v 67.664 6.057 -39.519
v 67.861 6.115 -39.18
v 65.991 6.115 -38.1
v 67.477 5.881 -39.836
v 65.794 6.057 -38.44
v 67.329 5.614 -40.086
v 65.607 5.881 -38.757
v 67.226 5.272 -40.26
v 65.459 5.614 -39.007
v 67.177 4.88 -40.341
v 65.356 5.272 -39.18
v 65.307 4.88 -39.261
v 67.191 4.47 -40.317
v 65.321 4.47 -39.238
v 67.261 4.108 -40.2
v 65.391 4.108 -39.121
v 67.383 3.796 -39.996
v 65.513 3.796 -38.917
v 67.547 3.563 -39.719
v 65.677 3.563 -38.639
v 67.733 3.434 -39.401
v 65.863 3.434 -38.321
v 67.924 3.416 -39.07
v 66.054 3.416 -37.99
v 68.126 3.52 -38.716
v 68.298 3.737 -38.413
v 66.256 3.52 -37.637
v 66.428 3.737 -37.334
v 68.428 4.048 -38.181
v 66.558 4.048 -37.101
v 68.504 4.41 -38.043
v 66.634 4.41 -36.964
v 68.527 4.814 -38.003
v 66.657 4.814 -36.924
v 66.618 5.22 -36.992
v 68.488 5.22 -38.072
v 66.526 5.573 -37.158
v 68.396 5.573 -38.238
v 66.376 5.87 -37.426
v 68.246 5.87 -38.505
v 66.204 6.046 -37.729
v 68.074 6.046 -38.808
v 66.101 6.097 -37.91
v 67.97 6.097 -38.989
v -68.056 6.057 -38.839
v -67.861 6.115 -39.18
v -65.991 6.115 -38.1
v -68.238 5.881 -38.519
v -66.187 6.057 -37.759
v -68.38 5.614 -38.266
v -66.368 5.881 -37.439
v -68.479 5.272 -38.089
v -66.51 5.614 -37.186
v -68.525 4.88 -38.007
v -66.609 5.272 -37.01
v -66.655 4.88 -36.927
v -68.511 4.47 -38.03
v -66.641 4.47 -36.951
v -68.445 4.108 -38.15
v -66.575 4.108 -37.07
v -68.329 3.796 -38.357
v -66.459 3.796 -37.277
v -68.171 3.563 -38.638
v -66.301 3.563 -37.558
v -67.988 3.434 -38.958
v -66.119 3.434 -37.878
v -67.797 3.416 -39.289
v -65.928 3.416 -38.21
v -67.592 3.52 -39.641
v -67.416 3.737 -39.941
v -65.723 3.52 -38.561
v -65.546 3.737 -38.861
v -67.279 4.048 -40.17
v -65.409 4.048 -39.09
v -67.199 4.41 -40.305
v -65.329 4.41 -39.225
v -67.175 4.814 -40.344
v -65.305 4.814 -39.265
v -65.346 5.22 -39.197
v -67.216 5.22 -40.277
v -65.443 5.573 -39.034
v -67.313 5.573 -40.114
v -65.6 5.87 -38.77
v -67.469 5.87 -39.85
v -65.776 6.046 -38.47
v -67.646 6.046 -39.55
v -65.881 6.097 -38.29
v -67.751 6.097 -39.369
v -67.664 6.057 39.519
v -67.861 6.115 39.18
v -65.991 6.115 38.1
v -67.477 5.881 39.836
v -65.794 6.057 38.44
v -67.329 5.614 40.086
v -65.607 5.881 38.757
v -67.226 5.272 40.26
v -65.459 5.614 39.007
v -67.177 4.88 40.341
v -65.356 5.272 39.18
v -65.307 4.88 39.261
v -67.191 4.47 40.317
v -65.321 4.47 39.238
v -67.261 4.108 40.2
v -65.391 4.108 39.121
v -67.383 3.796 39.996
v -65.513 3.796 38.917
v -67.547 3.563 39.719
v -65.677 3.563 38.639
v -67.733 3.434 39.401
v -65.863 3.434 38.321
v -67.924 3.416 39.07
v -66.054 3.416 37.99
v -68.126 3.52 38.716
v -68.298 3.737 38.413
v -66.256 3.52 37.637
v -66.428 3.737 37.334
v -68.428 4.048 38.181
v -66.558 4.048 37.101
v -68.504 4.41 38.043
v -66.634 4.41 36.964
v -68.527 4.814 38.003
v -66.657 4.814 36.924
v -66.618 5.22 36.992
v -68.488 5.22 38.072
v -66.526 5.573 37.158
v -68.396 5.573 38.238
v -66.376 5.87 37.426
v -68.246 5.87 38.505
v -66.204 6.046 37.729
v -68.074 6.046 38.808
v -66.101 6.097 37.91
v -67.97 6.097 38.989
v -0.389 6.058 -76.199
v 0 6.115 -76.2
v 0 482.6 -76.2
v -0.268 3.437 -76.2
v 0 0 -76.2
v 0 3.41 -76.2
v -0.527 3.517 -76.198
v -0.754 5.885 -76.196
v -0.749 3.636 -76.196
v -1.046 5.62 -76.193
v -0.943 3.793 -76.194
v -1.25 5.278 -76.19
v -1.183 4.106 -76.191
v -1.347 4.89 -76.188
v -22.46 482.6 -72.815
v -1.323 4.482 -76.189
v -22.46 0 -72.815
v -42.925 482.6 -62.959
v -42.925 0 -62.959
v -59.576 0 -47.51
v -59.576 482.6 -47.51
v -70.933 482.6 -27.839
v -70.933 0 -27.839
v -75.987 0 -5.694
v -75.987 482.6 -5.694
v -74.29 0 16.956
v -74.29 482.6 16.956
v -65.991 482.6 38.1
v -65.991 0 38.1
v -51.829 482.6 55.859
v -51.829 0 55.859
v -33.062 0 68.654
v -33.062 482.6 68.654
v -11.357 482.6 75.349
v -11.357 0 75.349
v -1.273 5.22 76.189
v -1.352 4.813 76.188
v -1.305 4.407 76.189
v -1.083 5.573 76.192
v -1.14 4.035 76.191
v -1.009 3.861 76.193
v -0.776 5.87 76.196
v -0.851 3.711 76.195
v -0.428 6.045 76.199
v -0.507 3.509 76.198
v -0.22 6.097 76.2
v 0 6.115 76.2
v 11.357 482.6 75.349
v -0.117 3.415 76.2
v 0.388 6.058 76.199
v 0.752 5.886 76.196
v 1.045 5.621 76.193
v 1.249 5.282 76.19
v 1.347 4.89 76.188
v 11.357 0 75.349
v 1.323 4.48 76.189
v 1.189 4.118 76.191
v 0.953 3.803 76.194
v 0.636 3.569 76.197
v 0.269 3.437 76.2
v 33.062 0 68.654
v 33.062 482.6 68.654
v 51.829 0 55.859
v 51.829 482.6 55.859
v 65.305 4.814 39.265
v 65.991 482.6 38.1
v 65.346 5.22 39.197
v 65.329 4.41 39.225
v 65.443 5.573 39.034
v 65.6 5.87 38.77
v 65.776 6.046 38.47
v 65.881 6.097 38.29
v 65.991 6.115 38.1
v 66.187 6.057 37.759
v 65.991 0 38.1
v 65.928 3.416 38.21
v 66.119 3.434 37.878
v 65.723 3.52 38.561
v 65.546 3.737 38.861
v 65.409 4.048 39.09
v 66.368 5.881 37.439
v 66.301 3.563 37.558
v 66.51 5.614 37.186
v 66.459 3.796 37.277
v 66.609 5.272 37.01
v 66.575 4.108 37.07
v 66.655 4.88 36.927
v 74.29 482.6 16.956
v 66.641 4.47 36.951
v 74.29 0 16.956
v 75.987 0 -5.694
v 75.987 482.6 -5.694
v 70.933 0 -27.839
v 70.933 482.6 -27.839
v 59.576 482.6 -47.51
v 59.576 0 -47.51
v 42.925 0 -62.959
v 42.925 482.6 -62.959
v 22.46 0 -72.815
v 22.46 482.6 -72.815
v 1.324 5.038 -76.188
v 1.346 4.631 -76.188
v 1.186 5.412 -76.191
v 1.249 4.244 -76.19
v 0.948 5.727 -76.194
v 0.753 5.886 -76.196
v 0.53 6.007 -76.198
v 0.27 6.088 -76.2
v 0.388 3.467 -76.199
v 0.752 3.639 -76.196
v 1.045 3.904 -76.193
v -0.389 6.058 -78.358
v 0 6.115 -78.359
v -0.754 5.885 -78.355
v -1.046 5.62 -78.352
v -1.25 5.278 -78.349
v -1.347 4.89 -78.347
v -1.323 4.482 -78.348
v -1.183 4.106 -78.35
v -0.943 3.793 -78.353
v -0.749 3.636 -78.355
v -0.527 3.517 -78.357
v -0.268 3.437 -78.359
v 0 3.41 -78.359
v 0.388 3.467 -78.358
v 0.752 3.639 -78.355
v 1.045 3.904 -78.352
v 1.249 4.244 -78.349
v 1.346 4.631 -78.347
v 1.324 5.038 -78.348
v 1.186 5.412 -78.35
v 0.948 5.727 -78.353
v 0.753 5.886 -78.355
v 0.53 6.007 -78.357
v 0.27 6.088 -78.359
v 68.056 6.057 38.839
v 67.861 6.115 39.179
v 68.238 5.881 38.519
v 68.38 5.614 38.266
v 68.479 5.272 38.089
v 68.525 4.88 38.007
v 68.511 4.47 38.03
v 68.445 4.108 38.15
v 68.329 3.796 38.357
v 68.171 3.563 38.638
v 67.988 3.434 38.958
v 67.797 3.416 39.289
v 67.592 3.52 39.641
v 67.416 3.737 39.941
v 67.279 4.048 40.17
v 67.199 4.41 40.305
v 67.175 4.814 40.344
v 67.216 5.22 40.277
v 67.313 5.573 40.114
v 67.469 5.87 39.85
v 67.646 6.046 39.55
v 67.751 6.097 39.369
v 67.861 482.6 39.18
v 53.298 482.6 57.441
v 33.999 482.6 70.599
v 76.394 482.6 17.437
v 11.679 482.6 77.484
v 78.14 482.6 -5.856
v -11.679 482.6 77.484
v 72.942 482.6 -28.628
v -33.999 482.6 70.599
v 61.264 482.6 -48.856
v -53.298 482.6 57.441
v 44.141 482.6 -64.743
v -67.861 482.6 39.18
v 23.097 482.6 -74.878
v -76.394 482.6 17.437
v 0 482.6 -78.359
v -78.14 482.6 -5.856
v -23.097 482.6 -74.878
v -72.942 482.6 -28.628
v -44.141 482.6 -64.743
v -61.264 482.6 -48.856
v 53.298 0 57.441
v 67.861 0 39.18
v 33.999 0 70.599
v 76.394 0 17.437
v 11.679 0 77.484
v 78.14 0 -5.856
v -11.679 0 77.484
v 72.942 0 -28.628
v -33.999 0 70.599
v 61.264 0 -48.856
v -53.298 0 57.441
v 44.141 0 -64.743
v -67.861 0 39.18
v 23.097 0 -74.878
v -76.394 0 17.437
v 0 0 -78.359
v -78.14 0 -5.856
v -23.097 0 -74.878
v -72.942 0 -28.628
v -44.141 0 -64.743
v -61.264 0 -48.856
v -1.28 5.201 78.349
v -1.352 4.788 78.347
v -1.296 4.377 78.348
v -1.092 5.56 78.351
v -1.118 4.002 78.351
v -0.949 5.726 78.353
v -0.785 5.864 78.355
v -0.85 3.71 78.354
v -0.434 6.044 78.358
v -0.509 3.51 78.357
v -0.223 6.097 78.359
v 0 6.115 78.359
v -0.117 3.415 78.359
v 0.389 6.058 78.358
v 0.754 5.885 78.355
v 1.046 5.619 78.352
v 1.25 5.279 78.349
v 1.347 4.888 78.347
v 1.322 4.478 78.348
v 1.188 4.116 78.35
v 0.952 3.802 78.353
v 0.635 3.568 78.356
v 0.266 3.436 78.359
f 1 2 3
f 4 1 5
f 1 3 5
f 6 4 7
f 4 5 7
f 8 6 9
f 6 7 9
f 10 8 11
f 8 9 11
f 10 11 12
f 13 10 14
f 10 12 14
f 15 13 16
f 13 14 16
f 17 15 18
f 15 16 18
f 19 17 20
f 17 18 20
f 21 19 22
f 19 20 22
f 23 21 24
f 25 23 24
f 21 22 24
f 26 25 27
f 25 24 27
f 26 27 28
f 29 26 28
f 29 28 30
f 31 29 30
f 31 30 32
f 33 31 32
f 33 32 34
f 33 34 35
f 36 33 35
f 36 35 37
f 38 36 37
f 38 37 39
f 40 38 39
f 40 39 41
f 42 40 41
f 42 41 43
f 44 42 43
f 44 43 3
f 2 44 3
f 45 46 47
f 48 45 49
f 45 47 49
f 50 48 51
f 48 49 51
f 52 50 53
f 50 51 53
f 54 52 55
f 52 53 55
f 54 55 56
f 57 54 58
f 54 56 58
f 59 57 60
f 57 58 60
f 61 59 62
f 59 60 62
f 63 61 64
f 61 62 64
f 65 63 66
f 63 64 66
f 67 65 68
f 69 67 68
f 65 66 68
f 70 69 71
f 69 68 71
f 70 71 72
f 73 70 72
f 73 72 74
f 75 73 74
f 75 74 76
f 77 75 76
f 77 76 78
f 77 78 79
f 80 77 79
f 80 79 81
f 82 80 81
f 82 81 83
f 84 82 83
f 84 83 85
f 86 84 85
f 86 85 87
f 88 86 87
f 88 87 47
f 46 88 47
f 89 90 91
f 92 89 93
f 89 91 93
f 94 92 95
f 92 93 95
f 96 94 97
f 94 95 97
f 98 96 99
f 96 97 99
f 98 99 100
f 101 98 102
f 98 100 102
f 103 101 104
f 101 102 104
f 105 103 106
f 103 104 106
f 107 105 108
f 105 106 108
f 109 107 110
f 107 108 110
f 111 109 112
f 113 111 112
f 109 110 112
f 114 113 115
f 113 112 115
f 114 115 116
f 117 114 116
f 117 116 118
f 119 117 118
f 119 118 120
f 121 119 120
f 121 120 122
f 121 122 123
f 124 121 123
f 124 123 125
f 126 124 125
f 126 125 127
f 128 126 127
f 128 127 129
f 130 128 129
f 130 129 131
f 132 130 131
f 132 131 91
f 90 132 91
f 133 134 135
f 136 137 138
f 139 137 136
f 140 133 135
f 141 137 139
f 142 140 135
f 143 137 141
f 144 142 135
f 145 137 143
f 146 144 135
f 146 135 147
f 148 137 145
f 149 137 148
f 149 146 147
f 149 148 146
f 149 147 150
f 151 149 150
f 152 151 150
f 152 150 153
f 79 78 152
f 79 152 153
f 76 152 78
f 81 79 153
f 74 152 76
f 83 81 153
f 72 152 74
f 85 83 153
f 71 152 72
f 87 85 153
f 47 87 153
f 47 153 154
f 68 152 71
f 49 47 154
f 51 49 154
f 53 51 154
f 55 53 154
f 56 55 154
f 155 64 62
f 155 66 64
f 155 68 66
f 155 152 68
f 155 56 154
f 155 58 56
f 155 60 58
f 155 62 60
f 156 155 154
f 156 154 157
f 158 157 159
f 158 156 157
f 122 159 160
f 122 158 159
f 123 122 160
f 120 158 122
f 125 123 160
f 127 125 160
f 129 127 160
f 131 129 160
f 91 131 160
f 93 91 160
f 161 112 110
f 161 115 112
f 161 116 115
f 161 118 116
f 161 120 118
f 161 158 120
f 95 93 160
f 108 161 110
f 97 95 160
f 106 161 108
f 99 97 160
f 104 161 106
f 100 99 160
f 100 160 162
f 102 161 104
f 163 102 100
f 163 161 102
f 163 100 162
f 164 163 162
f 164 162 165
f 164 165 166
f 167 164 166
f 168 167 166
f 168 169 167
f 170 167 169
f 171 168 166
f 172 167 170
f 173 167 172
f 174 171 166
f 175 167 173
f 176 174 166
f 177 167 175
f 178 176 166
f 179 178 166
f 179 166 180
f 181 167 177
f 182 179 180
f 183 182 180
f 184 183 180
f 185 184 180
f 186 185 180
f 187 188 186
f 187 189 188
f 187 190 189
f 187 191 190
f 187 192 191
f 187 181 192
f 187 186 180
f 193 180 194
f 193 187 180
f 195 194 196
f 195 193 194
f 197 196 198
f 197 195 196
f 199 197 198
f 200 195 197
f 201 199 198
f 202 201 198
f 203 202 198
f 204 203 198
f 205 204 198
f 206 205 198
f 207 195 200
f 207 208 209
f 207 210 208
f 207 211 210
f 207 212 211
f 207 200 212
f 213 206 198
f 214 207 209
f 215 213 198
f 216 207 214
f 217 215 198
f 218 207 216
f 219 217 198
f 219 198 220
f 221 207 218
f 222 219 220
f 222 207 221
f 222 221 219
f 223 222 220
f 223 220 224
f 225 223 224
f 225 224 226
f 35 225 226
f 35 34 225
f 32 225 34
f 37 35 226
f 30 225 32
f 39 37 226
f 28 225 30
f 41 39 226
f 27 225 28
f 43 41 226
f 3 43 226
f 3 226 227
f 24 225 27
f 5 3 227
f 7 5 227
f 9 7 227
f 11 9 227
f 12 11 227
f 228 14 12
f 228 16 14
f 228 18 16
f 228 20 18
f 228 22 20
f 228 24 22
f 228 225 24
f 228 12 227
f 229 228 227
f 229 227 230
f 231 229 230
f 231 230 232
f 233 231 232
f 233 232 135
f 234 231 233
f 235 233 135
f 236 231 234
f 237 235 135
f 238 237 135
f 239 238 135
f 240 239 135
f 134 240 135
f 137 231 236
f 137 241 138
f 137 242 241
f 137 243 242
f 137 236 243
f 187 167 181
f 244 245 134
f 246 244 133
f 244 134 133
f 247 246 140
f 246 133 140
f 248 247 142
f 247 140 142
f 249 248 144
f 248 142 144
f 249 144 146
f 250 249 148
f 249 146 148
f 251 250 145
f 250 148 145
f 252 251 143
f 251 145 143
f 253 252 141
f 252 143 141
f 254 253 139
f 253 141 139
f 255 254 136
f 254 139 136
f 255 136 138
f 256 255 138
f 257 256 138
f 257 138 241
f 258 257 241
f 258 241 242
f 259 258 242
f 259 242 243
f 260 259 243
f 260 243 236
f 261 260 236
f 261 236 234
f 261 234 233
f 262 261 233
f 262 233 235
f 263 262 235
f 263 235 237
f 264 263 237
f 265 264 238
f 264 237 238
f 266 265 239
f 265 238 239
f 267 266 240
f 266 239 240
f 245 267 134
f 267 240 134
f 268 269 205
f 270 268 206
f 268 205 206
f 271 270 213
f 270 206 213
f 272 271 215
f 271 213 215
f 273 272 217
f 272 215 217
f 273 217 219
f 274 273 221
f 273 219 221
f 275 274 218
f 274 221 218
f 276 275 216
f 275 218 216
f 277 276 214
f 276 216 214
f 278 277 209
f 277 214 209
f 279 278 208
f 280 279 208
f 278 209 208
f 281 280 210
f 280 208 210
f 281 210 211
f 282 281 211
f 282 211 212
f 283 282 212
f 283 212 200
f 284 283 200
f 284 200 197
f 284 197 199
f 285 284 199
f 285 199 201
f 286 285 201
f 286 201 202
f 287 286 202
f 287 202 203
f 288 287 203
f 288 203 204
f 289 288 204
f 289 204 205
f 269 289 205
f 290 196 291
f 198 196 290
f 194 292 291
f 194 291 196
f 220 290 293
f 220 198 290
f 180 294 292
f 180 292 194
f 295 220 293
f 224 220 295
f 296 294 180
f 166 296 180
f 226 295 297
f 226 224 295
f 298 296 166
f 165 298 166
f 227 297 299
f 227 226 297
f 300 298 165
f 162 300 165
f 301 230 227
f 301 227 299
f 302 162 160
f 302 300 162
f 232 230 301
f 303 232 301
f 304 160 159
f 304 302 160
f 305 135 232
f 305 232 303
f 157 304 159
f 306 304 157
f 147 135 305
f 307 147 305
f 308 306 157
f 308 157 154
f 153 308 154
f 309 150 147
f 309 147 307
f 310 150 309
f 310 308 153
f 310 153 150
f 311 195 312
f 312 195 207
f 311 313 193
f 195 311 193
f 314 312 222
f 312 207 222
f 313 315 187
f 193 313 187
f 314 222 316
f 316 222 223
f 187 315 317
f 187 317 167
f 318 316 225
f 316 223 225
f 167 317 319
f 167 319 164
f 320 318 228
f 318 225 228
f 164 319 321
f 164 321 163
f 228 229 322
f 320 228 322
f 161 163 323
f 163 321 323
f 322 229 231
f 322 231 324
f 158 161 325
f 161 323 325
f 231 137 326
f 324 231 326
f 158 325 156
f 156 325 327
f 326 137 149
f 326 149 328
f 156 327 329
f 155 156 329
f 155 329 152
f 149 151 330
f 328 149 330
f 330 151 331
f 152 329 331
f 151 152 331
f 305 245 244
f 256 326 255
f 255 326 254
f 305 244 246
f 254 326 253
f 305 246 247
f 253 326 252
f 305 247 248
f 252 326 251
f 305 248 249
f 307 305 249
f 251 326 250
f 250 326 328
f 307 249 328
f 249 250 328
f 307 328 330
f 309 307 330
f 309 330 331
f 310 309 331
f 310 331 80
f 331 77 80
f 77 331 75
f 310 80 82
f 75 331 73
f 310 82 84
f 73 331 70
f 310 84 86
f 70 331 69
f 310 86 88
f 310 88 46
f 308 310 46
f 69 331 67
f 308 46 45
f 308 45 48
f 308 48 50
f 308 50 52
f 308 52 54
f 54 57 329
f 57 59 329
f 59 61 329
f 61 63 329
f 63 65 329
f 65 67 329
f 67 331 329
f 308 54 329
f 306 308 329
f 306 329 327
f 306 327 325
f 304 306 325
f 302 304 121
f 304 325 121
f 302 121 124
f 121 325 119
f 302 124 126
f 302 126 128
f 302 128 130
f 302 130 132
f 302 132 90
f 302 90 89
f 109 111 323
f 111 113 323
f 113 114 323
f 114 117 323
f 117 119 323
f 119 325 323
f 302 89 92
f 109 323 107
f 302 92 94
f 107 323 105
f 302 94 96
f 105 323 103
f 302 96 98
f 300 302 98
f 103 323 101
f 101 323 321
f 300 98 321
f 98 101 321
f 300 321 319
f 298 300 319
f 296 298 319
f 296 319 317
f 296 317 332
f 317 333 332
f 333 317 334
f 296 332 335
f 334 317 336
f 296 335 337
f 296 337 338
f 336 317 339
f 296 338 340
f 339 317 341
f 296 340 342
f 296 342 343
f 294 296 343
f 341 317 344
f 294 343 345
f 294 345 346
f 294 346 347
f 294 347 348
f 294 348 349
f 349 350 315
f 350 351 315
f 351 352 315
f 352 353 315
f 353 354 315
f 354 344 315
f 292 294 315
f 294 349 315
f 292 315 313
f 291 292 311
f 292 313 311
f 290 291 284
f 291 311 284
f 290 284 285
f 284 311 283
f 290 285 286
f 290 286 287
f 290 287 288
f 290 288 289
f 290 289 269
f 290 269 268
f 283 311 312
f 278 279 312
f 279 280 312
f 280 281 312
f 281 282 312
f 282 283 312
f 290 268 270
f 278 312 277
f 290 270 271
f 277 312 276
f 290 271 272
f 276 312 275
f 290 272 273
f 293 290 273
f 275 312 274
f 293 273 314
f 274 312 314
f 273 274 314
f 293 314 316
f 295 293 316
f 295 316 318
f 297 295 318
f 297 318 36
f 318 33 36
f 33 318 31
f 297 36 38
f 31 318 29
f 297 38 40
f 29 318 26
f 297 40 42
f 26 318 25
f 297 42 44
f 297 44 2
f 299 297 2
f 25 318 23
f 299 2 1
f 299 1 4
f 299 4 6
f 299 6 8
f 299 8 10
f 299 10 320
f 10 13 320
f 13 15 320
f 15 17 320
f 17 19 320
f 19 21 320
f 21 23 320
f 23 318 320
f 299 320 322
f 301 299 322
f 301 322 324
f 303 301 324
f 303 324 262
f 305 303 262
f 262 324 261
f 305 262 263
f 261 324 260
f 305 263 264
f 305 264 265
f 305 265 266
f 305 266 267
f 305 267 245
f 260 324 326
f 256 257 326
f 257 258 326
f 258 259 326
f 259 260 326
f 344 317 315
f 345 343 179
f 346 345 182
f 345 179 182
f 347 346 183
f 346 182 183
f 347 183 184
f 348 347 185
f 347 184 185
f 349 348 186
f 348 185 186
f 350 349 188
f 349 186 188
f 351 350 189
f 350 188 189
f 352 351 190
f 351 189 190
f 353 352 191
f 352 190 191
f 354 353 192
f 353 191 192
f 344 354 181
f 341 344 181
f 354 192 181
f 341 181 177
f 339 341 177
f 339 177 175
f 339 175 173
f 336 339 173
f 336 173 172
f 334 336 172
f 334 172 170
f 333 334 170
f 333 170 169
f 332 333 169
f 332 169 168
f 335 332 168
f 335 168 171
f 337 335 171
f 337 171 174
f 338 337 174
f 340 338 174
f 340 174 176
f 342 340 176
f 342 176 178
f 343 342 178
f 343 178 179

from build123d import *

# Parameters (mm, degrees)
SKETCH1_R           = 78.359
SKETCH1_R_2         = 76.2
BOSS_EXTRUDE1_DEPTH = 482.6
SKETCH2_R           = 1.35255
CUT_EXTRUDE1_DEPTH  = 496.159596254
CIRPATTERN1_COUNT   = 6


with BuildPart() as part:
    # Sketch1 → Boss-Extrude1 (new body)
    with BuildSketch(Plane(origin=(0, 0, 0), x_dir=(1, 0, 0), z_dir=(0, 1, 0))):
        with Locations(Location((0, 0, 0), (0, 0, 90))):
            Circle(SKETCH1_R)
        with Locations(Location((0, 0, 0), (0, 0, 90))):
            Circle(SKETCH1_R_2, mode=Mode.SUBTRACT)
    extrude(amount=BOSS_EXTRUDE1_DEPTH)

    # Sketch2 → Cut-Extrude1 (cut, through all)
    with BuildSketch(Plane.XY):
        with Locations(Location((0, 4.7625, 0), (0, 0, 90))):
            Circle(SKETCH2_R)
    cut_extrude1 = extrude(amount=-CUT_EXTRUDE1_DEPTH, mode=Mode.SUBTRACT)

    # CirPattern1: Cut-Extrude1 ×6 about axis
    cirpattern1_axis = Axis((0, 482.6, 0), (0, -1, 0))
    for i in range(1, CIRPATTERN1_COUNT):
        add(cut_extrude1.rotate(cirpattern1_axis, i * 360 / CIRPATTERN1_COUNT), mode=Mode.SUBTRACT)


solid = part.part
